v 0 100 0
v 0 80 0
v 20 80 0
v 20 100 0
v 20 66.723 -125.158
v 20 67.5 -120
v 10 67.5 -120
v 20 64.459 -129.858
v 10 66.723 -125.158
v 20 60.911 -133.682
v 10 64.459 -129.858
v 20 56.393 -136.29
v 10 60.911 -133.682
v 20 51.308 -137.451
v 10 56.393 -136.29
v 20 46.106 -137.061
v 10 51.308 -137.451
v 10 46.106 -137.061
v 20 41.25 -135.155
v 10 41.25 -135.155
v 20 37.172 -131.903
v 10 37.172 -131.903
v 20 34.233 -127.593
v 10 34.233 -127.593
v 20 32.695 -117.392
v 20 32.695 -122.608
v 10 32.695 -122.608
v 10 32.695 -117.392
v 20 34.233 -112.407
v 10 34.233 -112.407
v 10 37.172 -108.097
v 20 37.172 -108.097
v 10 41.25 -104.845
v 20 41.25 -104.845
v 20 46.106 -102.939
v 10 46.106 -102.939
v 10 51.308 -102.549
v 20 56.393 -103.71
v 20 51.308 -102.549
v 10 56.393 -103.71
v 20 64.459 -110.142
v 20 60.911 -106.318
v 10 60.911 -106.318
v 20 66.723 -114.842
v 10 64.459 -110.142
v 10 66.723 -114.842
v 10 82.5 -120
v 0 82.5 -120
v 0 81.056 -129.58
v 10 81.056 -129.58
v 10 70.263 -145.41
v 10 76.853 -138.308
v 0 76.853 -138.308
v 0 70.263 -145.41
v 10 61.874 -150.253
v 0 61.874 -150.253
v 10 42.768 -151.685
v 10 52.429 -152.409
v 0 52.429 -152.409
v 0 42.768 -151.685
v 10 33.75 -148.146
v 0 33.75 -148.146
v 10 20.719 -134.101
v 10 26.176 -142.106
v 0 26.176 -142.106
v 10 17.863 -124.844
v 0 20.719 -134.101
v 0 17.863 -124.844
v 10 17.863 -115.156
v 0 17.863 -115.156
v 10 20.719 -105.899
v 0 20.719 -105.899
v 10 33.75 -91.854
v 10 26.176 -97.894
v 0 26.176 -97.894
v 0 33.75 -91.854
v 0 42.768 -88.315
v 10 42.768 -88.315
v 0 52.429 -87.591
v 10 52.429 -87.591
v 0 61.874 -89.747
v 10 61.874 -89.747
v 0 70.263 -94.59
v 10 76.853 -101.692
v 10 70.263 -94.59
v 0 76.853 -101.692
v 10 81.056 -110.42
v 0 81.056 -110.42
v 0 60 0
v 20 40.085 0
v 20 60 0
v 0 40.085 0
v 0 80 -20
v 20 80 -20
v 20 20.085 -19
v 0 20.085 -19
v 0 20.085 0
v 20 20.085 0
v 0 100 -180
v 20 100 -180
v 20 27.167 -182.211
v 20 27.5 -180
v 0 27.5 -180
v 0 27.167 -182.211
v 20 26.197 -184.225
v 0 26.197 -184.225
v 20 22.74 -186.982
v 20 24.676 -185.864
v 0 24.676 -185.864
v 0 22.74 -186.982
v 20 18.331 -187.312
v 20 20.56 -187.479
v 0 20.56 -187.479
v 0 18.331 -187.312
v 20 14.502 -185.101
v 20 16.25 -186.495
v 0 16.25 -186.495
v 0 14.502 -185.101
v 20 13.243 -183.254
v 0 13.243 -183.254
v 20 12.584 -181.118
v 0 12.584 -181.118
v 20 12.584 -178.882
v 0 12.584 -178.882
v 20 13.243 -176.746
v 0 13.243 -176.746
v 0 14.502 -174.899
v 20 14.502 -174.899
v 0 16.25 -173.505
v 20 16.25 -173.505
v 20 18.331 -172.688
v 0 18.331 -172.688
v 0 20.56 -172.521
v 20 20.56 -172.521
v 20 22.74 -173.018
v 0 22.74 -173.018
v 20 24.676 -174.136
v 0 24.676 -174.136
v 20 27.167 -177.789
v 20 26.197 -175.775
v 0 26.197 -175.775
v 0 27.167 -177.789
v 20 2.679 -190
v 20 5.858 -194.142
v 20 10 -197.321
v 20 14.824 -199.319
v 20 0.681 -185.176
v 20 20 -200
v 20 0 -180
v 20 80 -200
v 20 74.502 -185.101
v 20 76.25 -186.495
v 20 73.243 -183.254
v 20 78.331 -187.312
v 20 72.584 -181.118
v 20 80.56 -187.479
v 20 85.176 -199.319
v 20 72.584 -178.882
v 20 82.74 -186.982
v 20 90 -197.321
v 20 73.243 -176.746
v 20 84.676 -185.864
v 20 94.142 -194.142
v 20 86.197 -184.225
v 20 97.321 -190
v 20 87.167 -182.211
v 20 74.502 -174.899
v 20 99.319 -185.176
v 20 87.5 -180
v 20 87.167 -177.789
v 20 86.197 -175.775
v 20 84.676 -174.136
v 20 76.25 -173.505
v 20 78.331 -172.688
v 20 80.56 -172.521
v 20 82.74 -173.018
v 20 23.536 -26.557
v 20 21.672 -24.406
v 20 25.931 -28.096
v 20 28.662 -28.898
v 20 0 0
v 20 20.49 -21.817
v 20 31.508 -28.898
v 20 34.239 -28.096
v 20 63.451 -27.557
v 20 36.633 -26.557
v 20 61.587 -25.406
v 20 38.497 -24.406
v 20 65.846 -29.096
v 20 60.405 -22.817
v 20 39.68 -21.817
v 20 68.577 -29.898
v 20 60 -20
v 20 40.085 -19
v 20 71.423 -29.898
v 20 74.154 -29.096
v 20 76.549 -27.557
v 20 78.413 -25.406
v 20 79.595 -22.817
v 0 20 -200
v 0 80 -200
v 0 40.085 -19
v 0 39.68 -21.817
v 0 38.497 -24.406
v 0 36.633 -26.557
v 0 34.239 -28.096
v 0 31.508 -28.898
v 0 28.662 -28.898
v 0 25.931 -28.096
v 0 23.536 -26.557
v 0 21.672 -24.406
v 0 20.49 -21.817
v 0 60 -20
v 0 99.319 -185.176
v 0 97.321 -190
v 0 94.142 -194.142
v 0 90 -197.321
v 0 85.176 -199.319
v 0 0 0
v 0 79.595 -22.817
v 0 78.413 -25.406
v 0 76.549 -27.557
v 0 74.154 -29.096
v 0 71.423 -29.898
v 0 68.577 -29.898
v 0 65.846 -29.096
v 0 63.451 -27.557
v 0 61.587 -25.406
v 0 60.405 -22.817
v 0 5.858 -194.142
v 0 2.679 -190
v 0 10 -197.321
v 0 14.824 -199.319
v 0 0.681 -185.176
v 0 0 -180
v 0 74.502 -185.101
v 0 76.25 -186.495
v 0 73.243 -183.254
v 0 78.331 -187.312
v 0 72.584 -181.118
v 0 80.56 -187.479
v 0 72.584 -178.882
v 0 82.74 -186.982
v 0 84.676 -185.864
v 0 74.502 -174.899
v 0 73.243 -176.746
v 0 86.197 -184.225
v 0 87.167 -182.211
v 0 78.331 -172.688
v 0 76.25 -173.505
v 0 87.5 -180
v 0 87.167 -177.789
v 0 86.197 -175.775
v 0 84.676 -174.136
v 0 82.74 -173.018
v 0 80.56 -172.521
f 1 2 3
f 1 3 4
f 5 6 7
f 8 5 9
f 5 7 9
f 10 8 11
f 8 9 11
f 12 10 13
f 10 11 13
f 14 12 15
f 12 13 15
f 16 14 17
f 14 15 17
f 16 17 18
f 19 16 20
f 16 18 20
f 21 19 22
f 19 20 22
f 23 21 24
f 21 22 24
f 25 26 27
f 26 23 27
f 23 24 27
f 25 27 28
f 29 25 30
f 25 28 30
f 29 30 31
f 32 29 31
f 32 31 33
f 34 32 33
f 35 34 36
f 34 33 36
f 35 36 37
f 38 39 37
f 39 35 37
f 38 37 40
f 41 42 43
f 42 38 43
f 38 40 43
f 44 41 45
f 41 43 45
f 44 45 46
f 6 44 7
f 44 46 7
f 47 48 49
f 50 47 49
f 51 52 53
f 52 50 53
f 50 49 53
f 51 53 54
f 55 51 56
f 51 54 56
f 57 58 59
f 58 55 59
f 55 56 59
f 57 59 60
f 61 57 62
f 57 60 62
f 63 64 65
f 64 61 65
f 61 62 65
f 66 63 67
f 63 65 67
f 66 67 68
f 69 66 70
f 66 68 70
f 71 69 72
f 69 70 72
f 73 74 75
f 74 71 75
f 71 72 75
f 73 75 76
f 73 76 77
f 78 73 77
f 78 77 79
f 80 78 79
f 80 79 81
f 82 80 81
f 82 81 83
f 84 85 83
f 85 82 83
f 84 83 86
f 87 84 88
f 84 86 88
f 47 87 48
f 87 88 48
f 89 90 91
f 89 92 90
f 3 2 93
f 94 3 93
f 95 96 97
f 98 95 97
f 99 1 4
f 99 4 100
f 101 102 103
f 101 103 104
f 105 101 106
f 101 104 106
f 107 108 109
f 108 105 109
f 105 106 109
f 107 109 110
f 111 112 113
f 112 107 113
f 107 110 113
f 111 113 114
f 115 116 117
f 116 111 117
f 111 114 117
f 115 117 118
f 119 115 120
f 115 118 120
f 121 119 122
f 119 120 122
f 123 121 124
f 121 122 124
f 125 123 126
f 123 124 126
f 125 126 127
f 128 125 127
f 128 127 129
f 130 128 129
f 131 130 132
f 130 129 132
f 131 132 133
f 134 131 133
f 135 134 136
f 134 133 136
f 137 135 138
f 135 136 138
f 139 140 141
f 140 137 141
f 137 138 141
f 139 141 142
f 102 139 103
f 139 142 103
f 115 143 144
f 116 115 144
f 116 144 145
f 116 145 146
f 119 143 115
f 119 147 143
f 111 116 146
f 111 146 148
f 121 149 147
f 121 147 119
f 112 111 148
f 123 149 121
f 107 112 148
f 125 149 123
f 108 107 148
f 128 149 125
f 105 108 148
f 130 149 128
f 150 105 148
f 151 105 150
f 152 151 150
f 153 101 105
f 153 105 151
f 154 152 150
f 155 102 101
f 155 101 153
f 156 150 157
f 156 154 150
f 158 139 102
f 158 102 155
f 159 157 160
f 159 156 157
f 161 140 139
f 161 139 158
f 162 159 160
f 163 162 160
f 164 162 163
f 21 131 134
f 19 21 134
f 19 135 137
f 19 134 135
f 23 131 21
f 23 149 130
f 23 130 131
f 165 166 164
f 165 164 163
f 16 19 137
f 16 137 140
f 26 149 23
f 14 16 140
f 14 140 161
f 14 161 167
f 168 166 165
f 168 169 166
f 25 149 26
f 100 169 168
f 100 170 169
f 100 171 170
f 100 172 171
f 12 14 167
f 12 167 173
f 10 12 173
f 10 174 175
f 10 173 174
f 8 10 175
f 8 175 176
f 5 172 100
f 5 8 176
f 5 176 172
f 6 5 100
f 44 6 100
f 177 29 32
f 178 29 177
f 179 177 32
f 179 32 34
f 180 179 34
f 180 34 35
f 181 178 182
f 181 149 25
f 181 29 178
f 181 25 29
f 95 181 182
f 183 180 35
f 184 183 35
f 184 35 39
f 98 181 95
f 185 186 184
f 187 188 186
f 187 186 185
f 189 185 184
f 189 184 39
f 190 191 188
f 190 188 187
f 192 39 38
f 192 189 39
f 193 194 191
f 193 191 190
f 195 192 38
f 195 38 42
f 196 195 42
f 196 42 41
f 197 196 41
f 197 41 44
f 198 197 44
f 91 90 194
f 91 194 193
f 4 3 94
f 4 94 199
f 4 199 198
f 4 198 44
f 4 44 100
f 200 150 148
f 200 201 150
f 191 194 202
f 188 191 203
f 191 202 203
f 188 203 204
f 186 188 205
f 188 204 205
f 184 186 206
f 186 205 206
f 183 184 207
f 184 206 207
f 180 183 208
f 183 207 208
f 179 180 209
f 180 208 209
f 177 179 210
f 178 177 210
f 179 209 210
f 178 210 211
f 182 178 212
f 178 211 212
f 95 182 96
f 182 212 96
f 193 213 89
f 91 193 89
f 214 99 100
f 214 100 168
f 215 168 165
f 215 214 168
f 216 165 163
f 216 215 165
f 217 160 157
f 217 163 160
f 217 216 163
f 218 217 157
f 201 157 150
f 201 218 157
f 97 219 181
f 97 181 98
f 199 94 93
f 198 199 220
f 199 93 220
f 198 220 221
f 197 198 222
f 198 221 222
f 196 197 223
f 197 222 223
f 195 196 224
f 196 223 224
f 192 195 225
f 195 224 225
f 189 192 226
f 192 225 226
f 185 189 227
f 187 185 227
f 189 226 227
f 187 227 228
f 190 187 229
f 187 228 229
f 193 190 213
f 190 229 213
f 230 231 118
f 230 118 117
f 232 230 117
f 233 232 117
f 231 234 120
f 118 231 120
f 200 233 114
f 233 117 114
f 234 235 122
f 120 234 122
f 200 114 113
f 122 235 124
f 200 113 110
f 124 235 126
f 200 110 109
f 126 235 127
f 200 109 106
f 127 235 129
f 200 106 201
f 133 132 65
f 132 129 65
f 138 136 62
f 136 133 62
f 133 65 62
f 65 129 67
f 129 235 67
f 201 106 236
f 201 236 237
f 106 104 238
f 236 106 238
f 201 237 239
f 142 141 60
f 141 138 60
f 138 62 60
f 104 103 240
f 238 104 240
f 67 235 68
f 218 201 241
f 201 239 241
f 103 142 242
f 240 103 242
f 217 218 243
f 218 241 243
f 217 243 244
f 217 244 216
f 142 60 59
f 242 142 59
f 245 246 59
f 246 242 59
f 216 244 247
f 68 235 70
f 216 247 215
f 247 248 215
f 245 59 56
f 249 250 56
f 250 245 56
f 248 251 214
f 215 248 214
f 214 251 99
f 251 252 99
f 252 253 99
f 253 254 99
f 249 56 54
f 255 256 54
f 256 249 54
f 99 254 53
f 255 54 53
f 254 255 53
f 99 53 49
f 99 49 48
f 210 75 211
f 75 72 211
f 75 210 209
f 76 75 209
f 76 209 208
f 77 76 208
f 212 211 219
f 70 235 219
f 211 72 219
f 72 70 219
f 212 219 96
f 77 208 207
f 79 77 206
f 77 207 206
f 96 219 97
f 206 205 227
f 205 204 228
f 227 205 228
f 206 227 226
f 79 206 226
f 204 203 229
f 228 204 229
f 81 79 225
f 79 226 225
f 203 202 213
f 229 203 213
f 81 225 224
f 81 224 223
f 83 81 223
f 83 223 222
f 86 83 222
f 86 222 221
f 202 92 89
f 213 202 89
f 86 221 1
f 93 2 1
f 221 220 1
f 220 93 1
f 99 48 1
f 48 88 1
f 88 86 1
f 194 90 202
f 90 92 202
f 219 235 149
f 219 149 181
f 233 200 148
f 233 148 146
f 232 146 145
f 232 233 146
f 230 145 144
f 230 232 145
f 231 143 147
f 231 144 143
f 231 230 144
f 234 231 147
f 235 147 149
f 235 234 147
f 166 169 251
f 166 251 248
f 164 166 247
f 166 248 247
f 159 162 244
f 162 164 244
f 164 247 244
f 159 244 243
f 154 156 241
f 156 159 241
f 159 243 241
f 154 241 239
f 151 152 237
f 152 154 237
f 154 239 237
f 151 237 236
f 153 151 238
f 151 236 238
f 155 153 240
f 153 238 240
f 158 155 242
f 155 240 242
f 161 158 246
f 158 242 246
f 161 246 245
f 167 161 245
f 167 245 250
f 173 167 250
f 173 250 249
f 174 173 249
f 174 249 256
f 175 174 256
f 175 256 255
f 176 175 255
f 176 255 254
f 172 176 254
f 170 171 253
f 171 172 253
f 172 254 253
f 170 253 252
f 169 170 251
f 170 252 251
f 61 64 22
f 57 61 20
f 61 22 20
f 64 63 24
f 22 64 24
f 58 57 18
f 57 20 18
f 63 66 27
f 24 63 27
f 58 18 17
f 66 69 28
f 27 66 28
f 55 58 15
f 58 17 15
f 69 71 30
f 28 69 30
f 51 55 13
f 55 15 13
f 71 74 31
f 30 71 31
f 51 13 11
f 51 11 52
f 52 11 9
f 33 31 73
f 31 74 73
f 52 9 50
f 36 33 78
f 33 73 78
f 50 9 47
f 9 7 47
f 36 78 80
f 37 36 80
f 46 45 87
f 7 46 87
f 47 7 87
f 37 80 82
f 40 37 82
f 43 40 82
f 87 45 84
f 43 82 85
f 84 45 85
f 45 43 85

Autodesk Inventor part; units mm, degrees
ref_plane "YZ Plane" through (0, 0, 0) normal (1, 0, 0) x (0, 1, 0)
ref_plane "XZ Plane" through (0, 0, 0) normal (0, 1, 0) x (-1, 0, 0)
ref_plane "XY Plane" through (0, 0, 0) normal (0, 0, 1) x (1, 0, 0)
sketch "Sketch1" plane through (0, 0, 0) normal (1, 0, 0) x (0, 1, 0)
  line L0 (0, 0) -> (10.3831, 0)
  line L1 (0, 0) -> (12.9478, 0)
  line L2 (0, 0) -> (100, 0)
  line L3 (100, 0) -> (100, -180)
  line L4 (80, -200) -> (20, -200)
  line L5 (0, -180) -> (0, 0)
  line L6 (20.0847, 0) -> (40.0847, 0)
  line L7 (60, 0) -> (80, 0)
  line L8 (80, 0) -> (80, -20)
  line L9 (70, -30) -> (70, -30)
  line L10 (60, -20) -> (60, 0)
  line L11 (40.0847, 0) -> (40.0847, -19)
  line L12 (30.0847, -29) -> (30.0847, -29)
  line L13 (0, 0) -> (0, -30)
  line L14 (20.0847, -19) -> (20.0847, 0)
  arc A0 (80, -200) -> (100, -180) centre (80, -180) ccw
  arc A1 (0, -180) -> (20, -200) centre (20, -180) ccw
  arc A2 (30.0847, -29) -> (40.0847, -19) centre (30.0847, -19) ccw
  arc A3 (20.0847, -19) -> (30.0847, -29) centre (30.0847, -19) ccw
  arc A4 (60, -20) -> (70, -30) centre (70, -20) ccw
  arc A5 (70, -30) -> (80, -20) centre (70, -20) ccw
  circle A6 centre (80, -180) radius 7.5
  circle A7 centre (20, -180) radius 7.5
  circle A8 centre (50, -120) radius 17.5
  circle A9 centre (50, -120) radius 32.5
  point P0 (100, -200)
  point P1 (0, -200)
  dimension "d0" = 100
  dimension "d1" = 200
  dimension "d10" = 20
  dimension "d16" = 20
  dimension "d23" = 15
  dimension "d24" = 35
  dimension "d25" = 65
  dimension "d26" = 50
  dimension "d31" = 80
extrude "Extrusion1" add sketch "Sketch1" along normal blind 20 contours L0 L1 L2 L14 A3 A2 L11 L10 A4 A5 L8 L3 A0 L4 A1 L5 | A9
extrude "Extrusion2" cut sketch "Sketch1" along normal blind 10 contours A8 | A9
properties part number "Wkp 01.03.1"
